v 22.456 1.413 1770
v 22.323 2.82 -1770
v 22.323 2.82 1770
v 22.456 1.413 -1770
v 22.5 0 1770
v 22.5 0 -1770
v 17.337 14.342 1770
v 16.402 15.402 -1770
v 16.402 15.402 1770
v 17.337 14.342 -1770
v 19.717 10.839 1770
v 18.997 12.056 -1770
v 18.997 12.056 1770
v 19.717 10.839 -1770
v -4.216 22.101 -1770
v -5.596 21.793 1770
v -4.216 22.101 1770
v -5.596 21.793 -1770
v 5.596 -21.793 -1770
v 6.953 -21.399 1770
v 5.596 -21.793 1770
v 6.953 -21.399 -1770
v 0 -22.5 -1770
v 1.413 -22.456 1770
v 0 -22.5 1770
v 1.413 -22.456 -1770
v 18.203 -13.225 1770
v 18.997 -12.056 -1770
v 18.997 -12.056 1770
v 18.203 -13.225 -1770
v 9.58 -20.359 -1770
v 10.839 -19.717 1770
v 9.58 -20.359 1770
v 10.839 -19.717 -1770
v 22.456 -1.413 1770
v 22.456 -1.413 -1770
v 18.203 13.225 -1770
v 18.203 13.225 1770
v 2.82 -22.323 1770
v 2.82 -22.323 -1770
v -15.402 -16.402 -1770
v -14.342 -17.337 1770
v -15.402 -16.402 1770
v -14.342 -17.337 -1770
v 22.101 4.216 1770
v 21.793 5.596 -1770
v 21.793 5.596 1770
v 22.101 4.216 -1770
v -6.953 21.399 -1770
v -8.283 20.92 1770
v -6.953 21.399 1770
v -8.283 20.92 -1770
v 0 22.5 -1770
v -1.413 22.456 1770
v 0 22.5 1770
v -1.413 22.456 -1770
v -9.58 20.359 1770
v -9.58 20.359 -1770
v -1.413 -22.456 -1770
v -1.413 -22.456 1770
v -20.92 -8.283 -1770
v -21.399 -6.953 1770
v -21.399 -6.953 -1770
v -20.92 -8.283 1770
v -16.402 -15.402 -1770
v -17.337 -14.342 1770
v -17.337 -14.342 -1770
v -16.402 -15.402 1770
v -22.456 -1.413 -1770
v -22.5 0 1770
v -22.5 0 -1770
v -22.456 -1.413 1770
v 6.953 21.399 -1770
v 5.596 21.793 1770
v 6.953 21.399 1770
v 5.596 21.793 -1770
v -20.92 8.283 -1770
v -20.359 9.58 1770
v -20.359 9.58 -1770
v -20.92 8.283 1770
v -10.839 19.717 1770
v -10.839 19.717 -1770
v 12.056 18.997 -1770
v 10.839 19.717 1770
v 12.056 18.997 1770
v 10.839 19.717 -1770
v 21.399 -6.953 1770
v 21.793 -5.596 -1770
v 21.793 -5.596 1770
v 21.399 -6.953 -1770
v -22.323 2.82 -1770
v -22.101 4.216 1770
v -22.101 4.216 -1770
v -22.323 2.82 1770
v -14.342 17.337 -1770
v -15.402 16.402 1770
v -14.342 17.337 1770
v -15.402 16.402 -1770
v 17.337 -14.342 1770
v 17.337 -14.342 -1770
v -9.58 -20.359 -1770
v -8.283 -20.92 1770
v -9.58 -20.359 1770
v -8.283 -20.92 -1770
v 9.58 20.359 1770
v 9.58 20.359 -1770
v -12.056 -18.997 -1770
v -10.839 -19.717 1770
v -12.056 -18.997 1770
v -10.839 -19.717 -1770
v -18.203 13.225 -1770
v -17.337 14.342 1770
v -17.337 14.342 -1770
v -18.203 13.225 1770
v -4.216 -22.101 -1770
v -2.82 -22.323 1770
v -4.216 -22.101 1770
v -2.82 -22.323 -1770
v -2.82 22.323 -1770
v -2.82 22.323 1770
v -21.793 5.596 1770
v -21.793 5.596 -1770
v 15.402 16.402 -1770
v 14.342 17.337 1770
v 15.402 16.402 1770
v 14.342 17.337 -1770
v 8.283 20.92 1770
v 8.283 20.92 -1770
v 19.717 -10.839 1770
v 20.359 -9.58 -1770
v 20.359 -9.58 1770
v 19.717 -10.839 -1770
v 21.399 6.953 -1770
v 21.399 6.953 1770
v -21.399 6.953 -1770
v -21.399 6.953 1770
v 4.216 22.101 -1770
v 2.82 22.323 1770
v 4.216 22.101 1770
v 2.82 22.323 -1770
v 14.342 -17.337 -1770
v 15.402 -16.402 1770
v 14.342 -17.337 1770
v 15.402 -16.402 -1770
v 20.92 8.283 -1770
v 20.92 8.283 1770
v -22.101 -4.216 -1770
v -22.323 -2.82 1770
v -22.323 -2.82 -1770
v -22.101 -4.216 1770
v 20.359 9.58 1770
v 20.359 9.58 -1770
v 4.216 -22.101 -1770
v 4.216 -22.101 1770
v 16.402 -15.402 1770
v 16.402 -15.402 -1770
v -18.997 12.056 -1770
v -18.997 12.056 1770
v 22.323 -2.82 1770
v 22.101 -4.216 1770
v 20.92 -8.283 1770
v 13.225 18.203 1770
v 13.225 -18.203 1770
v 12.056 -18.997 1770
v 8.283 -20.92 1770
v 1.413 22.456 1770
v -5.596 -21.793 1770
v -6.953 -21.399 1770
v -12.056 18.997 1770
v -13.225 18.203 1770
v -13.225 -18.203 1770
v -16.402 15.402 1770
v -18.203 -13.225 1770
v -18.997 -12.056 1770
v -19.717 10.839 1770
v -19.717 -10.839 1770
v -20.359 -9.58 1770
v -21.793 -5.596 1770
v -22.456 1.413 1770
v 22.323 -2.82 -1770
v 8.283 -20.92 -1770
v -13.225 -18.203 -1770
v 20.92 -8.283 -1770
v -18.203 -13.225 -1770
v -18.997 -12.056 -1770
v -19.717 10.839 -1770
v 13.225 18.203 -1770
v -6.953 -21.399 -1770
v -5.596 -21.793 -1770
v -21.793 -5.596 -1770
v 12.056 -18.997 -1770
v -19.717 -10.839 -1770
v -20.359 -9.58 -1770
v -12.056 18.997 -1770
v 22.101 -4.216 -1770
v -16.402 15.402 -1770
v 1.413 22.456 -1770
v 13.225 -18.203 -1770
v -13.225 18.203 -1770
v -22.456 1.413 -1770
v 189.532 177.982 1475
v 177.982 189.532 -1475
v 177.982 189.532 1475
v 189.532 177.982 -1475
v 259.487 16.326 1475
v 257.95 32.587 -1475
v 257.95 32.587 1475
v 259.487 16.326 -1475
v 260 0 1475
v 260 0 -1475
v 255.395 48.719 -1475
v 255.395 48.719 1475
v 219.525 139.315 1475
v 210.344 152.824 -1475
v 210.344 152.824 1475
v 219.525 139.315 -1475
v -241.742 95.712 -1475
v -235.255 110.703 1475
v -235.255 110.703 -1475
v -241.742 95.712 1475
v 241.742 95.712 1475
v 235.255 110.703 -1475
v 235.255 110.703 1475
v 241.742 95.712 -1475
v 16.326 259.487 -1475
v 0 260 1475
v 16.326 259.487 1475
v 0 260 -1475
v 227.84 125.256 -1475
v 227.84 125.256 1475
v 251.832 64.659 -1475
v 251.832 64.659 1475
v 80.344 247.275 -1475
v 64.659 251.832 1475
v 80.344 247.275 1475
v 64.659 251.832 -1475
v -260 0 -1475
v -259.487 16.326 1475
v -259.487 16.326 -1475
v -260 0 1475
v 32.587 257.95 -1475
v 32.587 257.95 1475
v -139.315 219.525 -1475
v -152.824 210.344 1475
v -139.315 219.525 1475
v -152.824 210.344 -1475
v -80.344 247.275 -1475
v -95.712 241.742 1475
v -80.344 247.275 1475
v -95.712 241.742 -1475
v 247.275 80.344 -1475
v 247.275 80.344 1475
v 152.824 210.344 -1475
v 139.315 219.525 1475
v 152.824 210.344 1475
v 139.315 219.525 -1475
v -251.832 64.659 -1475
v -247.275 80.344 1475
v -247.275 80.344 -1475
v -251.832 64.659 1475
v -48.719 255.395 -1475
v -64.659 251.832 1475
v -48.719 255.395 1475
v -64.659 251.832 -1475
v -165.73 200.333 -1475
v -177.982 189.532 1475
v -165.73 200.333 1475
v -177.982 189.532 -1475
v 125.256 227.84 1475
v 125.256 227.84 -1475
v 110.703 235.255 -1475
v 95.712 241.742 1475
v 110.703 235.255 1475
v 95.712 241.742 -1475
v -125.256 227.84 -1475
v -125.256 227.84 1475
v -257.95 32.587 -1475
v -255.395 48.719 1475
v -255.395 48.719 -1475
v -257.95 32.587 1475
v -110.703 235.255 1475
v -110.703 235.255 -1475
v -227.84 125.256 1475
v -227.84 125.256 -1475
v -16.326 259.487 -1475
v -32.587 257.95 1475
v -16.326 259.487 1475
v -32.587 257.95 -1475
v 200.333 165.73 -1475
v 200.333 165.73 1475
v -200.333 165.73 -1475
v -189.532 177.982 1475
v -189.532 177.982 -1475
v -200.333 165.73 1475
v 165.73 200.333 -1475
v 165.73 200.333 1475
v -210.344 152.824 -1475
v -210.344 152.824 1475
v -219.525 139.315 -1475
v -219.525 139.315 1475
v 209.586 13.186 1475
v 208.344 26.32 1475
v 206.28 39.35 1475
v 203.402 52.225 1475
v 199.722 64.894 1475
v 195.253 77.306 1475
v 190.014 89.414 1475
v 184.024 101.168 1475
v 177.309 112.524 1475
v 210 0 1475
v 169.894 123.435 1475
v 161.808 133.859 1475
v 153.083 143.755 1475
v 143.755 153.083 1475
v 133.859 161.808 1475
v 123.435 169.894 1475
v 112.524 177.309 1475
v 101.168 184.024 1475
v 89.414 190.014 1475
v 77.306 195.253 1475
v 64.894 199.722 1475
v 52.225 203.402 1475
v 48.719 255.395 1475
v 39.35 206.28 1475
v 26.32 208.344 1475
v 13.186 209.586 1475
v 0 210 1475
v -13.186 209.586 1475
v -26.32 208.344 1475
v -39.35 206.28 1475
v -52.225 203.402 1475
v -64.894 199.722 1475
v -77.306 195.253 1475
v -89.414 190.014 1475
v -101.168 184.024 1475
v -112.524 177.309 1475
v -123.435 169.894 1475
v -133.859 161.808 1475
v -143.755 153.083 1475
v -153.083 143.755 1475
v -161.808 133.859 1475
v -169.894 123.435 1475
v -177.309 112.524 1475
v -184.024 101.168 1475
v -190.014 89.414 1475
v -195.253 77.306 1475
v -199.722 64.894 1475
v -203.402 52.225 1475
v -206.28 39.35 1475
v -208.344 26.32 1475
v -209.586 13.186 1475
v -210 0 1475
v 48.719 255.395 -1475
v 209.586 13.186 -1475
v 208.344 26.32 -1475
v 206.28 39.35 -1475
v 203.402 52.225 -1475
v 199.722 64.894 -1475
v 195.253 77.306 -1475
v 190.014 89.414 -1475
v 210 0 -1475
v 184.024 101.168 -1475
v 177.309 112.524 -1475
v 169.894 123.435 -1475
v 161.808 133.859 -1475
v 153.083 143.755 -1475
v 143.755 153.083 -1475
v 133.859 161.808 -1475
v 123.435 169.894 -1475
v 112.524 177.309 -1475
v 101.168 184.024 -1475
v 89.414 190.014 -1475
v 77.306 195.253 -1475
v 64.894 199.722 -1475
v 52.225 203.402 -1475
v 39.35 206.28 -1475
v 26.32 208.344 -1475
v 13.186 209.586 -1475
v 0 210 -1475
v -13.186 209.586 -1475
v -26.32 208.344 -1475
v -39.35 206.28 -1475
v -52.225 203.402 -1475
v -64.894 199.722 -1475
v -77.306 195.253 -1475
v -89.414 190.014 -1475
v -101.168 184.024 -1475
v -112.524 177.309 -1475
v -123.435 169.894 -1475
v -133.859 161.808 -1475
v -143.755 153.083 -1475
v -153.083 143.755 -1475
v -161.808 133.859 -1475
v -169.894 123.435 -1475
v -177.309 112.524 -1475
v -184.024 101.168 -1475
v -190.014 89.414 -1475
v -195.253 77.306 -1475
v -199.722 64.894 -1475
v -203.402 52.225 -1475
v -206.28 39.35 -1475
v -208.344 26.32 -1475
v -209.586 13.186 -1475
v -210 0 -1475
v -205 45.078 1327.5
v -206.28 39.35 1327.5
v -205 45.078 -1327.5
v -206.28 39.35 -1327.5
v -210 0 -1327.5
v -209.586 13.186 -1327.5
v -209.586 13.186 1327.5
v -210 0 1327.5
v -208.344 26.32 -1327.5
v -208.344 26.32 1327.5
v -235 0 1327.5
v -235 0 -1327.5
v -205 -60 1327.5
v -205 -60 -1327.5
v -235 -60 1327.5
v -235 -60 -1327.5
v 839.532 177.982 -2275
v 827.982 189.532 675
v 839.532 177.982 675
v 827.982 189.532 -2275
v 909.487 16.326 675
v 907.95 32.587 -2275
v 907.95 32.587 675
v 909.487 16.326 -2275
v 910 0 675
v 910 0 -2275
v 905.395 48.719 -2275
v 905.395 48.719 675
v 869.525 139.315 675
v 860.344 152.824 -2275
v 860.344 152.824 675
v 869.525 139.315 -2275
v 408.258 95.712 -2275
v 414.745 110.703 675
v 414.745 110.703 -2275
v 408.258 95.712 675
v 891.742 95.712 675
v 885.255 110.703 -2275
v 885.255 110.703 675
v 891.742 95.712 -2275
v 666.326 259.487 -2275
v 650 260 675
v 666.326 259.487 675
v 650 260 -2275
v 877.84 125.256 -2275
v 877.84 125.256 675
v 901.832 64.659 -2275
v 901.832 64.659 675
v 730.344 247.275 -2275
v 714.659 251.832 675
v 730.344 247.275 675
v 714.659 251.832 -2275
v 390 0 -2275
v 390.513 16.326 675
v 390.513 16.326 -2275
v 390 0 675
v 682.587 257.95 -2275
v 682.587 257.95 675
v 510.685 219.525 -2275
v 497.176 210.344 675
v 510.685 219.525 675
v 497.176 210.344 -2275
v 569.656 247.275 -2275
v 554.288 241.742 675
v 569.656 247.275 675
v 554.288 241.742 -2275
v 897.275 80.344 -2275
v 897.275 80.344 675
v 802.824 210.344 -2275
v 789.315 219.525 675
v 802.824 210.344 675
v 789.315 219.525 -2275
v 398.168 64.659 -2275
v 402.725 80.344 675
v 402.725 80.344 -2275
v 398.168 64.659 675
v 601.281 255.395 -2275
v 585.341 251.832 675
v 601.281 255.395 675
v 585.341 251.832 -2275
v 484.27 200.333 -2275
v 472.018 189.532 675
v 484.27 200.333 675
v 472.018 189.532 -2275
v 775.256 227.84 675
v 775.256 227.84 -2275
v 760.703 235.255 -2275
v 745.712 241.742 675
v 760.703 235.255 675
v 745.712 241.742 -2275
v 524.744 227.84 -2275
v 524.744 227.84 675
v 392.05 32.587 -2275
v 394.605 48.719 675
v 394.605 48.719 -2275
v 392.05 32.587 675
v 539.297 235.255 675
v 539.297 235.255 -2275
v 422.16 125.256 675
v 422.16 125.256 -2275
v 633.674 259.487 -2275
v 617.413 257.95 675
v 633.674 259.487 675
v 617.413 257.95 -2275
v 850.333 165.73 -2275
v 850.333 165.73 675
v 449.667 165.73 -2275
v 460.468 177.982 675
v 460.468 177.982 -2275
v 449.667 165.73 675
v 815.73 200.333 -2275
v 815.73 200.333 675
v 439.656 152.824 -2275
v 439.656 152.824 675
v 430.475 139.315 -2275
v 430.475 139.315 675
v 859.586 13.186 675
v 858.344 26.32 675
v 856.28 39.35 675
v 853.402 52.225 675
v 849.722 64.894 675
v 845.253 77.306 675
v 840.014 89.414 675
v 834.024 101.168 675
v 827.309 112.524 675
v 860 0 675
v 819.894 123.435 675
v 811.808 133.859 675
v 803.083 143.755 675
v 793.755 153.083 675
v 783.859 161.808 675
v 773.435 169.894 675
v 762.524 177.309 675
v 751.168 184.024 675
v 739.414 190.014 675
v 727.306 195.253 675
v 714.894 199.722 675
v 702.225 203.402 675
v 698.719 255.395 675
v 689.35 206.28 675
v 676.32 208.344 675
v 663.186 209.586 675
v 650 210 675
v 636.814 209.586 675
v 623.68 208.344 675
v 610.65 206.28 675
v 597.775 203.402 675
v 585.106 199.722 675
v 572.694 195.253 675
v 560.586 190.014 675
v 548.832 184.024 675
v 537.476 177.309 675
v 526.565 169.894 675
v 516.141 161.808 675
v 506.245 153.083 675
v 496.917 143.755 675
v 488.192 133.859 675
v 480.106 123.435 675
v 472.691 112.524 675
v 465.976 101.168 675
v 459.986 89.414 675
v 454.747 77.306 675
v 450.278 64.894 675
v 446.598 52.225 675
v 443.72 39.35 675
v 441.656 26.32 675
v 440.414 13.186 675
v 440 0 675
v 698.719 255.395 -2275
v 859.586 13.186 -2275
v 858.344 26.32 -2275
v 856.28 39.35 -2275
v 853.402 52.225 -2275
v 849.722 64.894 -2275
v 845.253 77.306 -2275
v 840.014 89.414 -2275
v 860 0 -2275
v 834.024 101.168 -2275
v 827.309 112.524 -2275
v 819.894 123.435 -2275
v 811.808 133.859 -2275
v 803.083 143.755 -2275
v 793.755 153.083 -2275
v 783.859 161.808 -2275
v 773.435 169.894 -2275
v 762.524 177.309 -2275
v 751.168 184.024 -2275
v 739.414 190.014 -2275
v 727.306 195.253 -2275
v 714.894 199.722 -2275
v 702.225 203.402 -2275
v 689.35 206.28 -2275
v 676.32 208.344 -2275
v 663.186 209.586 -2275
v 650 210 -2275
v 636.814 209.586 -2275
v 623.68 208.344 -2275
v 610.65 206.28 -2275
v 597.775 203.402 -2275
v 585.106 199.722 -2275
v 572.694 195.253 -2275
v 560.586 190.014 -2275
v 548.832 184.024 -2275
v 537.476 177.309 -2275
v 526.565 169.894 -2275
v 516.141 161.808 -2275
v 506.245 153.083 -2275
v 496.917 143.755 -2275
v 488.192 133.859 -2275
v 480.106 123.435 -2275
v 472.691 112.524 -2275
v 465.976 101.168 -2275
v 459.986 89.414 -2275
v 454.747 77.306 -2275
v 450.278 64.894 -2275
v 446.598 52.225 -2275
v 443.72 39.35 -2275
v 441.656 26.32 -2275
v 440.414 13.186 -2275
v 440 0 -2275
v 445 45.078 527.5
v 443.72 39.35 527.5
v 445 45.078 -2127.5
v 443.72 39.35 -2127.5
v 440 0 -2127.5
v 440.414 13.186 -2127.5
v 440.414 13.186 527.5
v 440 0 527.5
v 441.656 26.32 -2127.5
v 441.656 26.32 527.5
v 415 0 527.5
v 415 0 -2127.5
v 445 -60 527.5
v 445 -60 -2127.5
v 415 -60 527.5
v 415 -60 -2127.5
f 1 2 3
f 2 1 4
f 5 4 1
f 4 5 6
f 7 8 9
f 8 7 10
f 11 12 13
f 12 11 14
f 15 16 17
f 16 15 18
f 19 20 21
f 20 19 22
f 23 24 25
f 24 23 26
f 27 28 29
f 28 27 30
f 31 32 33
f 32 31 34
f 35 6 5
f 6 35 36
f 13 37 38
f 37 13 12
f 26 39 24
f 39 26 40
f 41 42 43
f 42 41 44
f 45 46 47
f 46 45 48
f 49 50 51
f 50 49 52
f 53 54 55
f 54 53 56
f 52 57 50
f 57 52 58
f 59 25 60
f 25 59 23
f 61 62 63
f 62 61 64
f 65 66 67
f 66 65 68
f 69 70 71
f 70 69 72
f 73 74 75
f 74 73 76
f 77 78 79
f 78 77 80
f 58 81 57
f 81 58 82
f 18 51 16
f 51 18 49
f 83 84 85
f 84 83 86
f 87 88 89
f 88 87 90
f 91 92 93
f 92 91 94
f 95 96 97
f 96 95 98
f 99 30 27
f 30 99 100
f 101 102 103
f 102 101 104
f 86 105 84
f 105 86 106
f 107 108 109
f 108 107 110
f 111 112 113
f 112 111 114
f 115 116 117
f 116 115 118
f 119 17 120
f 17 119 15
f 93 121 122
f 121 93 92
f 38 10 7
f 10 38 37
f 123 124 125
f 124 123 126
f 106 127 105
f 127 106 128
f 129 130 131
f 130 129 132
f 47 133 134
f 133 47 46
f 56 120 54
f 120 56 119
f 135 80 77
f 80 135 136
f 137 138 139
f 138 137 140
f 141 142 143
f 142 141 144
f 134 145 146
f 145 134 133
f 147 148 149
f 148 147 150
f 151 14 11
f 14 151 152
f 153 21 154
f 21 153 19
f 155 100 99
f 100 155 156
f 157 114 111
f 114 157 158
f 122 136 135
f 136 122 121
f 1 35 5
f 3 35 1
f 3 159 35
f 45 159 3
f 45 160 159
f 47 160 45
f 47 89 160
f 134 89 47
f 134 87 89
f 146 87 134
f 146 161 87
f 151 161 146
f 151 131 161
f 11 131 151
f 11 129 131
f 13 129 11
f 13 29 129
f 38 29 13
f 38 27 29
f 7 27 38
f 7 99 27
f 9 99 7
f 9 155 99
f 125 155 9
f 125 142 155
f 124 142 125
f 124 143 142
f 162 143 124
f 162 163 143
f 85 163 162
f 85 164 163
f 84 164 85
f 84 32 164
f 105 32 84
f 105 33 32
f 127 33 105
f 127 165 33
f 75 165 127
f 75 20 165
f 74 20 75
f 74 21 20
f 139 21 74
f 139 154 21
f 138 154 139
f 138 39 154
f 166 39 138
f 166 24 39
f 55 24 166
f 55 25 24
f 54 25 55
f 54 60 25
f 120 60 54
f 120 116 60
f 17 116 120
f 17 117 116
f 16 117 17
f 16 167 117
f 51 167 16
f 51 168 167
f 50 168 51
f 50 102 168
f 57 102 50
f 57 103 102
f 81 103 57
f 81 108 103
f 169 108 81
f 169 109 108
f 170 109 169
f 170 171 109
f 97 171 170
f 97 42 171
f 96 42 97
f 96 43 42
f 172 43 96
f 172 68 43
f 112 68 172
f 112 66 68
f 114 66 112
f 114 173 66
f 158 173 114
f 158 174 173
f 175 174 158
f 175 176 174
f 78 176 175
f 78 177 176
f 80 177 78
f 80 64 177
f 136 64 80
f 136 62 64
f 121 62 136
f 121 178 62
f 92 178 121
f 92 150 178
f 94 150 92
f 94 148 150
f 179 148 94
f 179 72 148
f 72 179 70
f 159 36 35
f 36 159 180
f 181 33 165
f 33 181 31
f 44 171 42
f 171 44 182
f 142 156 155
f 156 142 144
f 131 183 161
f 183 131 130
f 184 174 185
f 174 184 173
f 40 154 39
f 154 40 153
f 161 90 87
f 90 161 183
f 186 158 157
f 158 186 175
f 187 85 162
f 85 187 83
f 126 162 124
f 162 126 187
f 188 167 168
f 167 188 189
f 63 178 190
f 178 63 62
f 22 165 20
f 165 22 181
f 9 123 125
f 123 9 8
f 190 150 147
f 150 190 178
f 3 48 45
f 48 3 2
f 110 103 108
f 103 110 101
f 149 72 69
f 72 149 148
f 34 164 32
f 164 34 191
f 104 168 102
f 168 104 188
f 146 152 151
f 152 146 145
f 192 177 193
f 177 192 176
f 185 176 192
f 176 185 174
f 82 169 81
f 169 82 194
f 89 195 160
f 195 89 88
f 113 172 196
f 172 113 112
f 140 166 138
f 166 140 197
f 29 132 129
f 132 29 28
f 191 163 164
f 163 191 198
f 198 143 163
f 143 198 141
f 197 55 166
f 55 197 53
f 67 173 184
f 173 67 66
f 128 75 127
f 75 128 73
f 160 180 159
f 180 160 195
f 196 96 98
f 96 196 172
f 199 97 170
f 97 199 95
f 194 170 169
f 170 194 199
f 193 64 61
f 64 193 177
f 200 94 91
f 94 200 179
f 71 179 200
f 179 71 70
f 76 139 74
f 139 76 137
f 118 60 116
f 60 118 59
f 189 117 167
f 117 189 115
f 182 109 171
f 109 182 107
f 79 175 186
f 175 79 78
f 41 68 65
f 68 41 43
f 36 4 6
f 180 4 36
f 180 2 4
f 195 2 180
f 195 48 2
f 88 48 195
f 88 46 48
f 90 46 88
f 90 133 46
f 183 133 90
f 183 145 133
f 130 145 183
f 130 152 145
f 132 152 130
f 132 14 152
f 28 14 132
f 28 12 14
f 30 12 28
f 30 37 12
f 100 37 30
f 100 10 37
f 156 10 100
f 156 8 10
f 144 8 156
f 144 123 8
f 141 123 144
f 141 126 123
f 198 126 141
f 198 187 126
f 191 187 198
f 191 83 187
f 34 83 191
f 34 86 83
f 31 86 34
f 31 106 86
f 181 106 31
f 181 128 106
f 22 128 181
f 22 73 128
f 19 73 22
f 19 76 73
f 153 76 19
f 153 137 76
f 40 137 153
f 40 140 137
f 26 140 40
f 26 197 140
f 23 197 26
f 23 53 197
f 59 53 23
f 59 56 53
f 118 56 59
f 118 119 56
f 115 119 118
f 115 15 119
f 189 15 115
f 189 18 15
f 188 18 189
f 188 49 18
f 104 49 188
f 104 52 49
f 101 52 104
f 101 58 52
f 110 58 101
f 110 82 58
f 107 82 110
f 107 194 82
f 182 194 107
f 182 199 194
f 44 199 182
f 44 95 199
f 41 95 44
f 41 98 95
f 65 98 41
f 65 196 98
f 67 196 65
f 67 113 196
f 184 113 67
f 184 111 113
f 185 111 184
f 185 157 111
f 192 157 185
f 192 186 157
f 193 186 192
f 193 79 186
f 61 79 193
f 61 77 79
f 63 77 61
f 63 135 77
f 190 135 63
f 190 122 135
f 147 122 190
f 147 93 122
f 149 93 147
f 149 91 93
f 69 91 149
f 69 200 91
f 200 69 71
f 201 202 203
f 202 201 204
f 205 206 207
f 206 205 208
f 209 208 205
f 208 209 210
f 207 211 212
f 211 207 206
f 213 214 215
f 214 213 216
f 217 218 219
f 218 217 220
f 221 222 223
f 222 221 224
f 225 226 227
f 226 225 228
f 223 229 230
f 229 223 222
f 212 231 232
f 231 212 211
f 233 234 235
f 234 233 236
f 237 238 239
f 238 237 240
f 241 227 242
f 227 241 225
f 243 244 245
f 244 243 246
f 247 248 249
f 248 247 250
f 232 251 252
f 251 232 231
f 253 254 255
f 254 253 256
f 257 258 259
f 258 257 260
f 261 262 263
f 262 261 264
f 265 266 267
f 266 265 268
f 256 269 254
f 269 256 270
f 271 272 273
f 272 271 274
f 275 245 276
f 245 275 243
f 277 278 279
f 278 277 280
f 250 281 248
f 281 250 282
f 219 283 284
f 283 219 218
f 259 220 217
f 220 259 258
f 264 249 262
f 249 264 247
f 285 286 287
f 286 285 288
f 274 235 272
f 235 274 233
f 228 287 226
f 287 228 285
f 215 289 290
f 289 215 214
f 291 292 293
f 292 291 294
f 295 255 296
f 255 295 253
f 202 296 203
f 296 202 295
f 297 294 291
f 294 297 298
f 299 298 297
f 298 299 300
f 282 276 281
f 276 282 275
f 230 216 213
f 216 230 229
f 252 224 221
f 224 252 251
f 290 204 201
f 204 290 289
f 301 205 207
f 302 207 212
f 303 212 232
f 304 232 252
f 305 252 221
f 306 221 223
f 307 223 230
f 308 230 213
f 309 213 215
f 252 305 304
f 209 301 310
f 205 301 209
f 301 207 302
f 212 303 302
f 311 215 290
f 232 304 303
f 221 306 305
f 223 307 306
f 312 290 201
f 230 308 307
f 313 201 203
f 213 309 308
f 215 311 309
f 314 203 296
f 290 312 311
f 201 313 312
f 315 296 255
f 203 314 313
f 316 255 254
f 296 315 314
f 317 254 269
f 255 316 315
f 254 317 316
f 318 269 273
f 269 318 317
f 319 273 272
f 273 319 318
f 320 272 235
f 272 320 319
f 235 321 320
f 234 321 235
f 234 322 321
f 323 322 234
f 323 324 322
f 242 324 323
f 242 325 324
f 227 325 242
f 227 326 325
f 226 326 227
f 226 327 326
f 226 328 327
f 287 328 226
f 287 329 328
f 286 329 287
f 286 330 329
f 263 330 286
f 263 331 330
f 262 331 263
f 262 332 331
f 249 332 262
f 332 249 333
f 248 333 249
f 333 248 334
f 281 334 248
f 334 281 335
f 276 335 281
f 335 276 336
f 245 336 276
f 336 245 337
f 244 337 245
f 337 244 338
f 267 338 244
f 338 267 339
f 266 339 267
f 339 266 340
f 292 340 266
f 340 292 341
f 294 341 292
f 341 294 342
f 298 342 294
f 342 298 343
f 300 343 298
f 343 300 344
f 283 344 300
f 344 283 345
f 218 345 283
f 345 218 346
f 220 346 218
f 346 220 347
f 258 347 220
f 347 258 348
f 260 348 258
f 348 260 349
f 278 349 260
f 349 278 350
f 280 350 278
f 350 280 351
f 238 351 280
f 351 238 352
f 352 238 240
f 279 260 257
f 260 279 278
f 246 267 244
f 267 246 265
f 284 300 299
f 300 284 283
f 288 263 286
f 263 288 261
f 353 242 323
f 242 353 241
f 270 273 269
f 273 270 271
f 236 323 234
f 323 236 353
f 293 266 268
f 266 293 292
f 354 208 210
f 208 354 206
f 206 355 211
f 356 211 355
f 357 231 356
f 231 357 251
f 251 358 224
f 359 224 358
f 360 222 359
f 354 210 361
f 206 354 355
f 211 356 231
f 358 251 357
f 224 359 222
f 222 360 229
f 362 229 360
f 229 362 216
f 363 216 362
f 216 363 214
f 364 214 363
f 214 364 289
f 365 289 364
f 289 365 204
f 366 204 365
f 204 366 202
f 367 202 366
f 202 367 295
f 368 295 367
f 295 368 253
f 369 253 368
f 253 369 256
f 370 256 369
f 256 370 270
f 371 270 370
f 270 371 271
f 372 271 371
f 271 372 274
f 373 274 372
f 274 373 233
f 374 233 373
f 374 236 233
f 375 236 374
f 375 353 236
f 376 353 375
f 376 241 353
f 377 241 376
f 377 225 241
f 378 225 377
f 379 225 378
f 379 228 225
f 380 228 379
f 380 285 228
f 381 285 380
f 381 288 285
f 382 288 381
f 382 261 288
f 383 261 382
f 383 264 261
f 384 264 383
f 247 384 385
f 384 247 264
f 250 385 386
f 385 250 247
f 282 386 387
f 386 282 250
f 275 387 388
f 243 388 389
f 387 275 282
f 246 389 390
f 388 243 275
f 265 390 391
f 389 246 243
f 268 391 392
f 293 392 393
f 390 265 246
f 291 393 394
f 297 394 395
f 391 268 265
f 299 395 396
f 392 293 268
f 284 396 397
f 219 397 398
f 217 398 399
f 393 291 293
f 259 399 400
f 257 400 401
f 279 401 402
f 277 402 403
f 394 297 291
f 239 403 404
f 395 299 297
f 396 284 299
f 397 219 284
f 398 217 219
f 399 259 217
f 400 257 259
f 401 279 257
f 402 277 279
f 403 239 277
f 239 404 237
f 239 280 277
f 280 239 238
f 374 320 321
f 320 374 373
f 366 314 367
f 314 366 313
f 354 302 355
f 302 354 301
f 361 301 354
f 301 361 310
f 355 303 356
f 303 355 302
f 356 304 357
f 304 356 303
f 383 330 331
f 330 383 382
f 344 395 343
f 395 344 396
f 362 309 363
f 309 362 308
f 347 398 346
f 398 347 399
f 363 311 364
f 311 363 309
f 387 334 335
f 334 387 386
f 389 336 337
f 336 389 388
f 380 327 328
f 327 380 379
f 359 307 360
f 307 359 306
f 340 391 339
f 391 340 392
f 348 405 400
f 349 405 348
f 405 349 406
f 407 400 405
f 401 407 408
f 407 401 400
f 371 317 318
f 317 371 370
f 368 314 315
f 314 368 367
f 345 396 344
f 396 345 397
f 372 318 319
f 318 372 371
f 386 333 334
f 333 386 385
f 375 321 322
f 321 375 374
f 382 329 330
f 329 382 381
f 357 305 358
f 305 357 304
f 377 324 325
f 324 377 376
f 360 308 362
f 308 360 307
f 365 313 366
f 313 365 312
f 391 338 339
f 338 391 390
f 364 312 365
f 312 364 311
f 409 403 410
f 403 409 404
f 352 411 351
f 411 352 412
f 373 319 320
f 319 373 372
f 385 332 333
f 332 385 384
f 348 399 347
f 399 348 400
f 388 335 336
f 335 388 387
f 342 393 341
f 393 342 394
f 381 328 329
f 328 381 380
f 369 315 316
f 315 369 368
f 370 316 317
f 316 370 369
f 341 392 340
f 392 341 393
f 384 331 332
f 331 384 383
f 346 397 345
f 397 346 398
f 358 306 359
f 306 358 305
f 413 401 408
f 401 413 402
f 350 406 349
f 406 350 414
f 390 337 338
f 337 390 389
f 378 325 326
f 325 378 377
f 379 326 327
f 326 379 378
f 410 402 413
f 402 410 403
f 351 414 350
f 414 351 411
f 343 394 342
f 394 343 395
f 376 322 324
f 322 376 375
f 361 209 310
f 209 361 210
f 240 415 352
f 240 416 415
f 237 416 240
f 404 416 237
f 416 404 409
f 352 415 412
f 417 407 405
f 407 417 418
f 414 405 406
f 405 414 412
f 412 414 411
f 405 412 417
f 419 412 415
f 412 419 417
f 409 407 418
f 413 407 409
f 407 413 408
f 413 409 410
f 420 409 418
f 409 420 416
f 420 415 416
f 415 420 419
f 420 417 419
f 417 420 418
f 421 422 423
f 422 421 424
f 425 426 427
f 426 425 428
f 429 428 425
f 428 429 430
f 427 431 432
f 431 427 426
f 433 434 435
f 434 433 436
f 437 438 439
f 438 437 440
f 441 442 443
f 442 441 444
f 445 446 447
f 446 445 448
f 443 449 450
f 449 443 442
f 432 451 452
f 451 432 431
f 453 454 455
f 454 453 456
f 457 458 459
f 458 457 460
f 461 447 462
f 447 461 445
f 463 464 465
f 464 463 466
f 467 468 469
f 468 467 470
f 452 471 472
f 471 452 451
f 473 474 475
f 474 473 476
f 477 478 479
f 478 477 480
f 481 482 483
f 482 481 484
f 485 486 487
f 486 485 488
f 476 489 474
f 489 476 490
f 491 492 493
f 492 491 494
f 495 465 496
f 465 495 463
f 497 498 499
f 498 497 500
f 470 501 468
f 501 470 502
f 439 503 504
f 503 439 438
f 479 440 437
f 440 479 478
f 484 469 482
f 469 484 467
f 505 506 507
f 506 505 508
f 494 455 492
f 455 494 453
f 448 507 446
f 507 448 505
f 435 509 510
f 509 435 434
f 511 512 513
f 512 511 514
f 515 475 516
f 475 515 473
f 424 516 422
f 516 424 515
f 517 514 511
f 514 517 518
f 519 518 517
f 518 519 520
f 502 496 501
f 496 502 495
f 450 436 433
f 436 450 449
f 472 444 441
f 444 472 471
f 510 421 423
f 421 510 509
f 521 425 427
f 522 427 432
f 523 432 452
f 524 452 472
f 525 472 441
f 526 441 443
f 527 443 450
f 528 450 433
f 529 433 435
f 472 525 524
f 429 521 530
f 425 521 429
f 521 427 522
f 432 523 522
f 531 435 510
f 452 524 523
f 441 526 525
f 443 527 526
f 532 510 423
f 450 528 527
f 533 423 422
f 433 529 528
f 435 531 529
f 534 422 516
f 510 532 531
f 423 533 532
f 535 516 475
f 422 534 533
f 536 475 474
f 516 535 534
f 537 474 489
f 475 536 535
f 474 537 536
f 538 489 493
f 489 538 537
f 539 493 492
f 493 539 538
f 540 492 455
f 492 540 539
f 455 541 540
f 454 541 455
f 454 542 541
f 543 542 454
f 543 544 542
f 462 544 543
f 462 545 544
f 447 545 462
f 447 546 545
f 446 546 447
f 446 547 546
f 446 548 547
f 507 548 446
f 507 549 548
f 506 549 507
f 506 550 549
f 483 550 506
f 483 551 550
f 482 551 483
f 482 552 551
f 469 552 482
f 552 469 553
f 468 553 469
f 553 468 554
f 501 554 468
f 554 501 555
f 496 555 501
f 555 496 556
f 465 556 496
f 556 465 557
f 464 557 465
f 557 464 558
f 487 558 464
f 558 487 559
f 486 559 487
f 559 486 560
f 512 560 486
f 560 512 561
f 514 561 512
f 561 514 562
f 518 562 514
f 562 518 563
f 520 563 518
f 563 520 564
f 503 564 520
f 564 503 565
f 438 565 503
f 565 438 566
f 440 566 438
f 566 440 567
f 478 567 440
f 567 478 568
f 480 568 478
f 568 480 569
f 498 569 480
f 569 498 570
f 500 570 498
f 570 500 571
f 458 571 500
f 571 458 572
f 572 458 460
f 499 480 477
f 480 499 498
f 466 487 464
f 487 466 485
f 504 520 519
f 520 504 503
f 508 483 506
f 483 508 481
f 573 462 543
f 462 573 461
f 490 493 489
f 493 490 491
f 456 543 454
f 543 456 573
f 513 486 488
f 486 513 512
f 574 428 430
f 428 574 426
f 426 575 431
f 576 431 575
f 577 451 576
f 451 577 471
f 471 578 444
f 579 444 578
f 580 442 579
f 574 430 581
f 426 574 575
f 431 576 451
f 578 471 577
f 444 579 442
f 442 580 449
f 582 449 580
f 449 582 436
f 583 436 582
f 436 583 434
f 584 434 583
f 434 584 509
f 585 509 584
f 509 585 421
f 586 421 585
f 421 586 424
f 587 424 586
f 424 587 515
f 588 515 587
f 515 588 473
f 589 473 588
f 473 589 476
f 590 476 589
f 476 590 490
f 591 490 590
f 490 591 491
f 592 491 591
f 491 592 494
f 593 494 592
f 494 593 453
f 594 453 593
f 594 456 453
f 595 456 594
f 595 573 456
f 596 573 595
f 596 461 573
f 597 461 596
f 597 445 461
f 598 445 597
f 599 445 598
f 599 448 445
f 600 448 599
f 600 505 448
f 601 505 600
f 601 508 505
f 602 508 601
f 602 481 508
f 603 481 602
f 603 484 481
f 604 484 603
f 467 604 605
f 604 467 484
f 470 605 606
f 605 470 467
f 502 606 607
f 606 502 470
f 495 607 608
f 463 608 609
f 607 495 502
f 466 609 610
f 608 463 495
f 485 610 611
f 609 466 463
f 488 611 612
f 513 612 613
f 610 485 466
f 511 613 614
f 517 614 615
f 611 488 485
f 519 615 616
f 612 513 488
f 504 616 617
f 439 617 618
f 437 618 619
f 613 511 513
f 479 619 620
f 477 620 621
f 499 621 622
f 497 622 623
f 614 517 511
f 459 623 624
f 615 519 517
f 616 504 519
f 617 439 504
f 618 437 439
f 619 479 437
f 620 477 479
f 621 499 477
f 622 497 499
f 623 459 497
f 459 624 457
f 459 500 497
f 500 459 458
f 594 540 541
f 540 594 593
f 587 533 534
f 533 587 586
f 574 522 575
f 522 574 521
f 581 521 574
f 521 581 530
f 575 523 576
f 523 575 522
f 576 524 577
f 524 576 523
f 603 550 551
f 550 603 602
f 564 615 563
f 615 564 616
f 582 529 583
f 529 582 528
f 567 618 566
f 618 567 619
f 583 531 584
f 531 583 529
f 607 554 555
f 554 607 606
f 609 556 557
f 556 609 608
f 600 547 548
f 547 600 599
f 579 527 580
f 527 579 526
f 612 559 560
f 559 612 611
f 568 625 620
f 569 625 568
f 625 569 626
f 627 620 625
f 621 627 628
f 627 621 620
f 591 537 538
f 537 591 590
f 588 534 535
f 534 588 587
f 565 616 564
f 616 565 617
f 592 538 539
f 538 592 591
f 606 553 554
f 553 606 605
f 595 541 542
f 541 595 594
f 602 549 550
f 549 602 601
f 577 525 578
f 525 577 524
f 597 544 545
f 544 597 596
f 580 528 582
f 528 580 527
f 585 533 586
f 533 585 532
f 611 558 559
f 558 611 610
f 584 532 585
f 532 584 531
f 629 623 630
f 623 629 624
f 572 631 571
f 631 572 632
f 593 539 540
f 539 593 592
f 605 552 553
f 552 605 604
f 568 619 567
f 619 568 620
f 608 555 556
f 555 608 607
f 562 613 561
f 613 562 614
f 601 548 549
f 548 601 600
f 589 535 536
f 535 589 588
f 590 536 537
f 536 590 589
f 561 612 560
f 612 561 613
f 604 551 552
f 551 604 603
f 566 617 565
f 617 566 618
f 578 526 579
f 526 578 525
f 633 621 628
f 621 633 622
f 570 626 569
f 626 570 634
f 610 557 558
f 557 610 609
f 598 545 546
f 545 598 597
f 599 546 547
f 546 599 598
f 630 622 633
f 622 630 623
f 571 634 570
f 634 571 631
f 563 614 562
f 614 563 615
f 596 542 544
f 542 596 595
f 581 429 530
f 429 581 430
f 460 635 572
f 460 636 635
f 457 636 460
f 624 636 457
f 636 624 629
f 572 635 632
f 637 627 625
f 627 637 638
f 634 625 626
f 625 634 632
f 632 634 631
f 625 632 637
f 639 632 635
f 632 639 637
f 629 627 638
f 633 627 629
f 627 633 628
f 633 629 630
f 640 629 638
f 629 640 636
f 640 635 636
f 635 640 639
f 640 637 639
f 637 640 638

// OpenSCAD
// ============================================================================
// PROJECT: XXXG-00W0 WING GUNDAM ZERO EW - WEAPON FABRICATION CORES
// COMPONENT VAULT: BANDAI CAST RUNNER D - TWIN BUSTER RIFLE MODIFIED BARRELS
// ENGINE RE-ARCHITECTURE: CONTINUOUS OPEN-ENDED INDUCTION PLASMA BORE
// CIRCUIT SPECS: HIGH-VOLTAGE TELEMETRIC POWER INTEGRATION (ZERO SUCTION POP)
// ============================================================================

$fn = 100; // Circular segment rendering resolution count

// Global Tactical Sizing Metrics (1:1 Metrics for an 16.7-Meter Airframe)
rifle_total_length = 5900;              // Total longitudinal barrel weapon axis (mm)
open_bore_diameter = 420;               // Core 16.5-inch continuous venting path (mm)
armor_chassis_wall = 50;                // Thick TiAl protective shell casing (mm)
power_rail_track_width = 120;           // Sub-surface 4oz copper delivery rail (mm)

module Runner_D_Open_Rifle_Forge() {
    // Central Supply Injection Runner Axis (Molten Feed Line from Siphon Forge)
    color([0.25, 0.25, 0.28]) {
        cylinder(h = rifle_total_length * 0.6, d = 45, center = true);
        // Direct injection gates tracking straight into the part mold cavities
        translate() rotate() cylinder(h = 600, d = 25);
        translate([0, 0, -1200]) rotate() cylinder(h = 600, d = 25);
    }
    
    // Instantiate Scaled Open-Ended Part Molds Symmetrically
    Cast_Open_Ended_Rifle_Shells();
}

module Cast_Open_Ended_Rifle_Shells() {
    // ---- PART D1 MODIFIED: OPEN-ENDED MAIN BARREL HULL (LEFT HALF-SHELL) ----
    translate() color([0.5, 0.5, 0.55]) {
        difference() {
            // Main weapon structural barrel enclosure block
            cylinder(h = rifle_total_length * 0.5, d = open_bore_diameter + (armor_chassis_wall * 2), center = true);
            
            // CONTINUOUS OPEN-ENDED BORE [Cuts completely through both ends of the weapon cylinder]
            cylinder(h = rifle_total_length * 0.6, d = open_bore_diameter, center = true);
            
            // Slicing profile tool to generate clean asymmetrical shell panel face
            translate([0, -open_bore_diameter, 0])
                cube([open_bore_diameter * 2, open_bore_diameter * 2, rifle_total_length], center = true);
        }
        
        // INTEGRATED 4OZ POWER DELIVERY RAILS [Cast directly into the open frame walls]
        color([1.0, 0.73, 0.2]) {
            translate([-(open_bore_diameter/2 + 10), 0, 0])
                cube([30, power_rail_track_width, rifle_total_length * 0.45], center = true);
        }
    }
    
    // ---- PART D2 MODIFIED: OPEN-ENDED MAIN BARREL HULL (RIGHT HALF-SHELL) ----
    translate([650, 0, -800]) rotate() color([0.5, 0.5, 0.55]) {
        difference() {
            cylinder(h = rifle_total_length * 0.5, d = open_bore_diameter + (armor_chassis_wall * 2), center = true);
            cylinder(h = rifle_total_length * 0.6, d = open_bore_diameter, center = true);
            translate([0, -open_bore_diameter, 0])
                cube([open_bore_diameter * 2, open_bore_diameter * 2, rifle_total_length], center = true);
        }
        
        color([1.0, 0.73, 0.2]) {
            translate([-(open_bore_diameter/2 + 10), 0, 0])
                cube([30, power_rail_track_width, rifle_total_length * 0.45], center = true);
        }
    }
}

// Render Master Assembly to Parameter Workspace
Runner_D_Open_Rifle_Forge();
